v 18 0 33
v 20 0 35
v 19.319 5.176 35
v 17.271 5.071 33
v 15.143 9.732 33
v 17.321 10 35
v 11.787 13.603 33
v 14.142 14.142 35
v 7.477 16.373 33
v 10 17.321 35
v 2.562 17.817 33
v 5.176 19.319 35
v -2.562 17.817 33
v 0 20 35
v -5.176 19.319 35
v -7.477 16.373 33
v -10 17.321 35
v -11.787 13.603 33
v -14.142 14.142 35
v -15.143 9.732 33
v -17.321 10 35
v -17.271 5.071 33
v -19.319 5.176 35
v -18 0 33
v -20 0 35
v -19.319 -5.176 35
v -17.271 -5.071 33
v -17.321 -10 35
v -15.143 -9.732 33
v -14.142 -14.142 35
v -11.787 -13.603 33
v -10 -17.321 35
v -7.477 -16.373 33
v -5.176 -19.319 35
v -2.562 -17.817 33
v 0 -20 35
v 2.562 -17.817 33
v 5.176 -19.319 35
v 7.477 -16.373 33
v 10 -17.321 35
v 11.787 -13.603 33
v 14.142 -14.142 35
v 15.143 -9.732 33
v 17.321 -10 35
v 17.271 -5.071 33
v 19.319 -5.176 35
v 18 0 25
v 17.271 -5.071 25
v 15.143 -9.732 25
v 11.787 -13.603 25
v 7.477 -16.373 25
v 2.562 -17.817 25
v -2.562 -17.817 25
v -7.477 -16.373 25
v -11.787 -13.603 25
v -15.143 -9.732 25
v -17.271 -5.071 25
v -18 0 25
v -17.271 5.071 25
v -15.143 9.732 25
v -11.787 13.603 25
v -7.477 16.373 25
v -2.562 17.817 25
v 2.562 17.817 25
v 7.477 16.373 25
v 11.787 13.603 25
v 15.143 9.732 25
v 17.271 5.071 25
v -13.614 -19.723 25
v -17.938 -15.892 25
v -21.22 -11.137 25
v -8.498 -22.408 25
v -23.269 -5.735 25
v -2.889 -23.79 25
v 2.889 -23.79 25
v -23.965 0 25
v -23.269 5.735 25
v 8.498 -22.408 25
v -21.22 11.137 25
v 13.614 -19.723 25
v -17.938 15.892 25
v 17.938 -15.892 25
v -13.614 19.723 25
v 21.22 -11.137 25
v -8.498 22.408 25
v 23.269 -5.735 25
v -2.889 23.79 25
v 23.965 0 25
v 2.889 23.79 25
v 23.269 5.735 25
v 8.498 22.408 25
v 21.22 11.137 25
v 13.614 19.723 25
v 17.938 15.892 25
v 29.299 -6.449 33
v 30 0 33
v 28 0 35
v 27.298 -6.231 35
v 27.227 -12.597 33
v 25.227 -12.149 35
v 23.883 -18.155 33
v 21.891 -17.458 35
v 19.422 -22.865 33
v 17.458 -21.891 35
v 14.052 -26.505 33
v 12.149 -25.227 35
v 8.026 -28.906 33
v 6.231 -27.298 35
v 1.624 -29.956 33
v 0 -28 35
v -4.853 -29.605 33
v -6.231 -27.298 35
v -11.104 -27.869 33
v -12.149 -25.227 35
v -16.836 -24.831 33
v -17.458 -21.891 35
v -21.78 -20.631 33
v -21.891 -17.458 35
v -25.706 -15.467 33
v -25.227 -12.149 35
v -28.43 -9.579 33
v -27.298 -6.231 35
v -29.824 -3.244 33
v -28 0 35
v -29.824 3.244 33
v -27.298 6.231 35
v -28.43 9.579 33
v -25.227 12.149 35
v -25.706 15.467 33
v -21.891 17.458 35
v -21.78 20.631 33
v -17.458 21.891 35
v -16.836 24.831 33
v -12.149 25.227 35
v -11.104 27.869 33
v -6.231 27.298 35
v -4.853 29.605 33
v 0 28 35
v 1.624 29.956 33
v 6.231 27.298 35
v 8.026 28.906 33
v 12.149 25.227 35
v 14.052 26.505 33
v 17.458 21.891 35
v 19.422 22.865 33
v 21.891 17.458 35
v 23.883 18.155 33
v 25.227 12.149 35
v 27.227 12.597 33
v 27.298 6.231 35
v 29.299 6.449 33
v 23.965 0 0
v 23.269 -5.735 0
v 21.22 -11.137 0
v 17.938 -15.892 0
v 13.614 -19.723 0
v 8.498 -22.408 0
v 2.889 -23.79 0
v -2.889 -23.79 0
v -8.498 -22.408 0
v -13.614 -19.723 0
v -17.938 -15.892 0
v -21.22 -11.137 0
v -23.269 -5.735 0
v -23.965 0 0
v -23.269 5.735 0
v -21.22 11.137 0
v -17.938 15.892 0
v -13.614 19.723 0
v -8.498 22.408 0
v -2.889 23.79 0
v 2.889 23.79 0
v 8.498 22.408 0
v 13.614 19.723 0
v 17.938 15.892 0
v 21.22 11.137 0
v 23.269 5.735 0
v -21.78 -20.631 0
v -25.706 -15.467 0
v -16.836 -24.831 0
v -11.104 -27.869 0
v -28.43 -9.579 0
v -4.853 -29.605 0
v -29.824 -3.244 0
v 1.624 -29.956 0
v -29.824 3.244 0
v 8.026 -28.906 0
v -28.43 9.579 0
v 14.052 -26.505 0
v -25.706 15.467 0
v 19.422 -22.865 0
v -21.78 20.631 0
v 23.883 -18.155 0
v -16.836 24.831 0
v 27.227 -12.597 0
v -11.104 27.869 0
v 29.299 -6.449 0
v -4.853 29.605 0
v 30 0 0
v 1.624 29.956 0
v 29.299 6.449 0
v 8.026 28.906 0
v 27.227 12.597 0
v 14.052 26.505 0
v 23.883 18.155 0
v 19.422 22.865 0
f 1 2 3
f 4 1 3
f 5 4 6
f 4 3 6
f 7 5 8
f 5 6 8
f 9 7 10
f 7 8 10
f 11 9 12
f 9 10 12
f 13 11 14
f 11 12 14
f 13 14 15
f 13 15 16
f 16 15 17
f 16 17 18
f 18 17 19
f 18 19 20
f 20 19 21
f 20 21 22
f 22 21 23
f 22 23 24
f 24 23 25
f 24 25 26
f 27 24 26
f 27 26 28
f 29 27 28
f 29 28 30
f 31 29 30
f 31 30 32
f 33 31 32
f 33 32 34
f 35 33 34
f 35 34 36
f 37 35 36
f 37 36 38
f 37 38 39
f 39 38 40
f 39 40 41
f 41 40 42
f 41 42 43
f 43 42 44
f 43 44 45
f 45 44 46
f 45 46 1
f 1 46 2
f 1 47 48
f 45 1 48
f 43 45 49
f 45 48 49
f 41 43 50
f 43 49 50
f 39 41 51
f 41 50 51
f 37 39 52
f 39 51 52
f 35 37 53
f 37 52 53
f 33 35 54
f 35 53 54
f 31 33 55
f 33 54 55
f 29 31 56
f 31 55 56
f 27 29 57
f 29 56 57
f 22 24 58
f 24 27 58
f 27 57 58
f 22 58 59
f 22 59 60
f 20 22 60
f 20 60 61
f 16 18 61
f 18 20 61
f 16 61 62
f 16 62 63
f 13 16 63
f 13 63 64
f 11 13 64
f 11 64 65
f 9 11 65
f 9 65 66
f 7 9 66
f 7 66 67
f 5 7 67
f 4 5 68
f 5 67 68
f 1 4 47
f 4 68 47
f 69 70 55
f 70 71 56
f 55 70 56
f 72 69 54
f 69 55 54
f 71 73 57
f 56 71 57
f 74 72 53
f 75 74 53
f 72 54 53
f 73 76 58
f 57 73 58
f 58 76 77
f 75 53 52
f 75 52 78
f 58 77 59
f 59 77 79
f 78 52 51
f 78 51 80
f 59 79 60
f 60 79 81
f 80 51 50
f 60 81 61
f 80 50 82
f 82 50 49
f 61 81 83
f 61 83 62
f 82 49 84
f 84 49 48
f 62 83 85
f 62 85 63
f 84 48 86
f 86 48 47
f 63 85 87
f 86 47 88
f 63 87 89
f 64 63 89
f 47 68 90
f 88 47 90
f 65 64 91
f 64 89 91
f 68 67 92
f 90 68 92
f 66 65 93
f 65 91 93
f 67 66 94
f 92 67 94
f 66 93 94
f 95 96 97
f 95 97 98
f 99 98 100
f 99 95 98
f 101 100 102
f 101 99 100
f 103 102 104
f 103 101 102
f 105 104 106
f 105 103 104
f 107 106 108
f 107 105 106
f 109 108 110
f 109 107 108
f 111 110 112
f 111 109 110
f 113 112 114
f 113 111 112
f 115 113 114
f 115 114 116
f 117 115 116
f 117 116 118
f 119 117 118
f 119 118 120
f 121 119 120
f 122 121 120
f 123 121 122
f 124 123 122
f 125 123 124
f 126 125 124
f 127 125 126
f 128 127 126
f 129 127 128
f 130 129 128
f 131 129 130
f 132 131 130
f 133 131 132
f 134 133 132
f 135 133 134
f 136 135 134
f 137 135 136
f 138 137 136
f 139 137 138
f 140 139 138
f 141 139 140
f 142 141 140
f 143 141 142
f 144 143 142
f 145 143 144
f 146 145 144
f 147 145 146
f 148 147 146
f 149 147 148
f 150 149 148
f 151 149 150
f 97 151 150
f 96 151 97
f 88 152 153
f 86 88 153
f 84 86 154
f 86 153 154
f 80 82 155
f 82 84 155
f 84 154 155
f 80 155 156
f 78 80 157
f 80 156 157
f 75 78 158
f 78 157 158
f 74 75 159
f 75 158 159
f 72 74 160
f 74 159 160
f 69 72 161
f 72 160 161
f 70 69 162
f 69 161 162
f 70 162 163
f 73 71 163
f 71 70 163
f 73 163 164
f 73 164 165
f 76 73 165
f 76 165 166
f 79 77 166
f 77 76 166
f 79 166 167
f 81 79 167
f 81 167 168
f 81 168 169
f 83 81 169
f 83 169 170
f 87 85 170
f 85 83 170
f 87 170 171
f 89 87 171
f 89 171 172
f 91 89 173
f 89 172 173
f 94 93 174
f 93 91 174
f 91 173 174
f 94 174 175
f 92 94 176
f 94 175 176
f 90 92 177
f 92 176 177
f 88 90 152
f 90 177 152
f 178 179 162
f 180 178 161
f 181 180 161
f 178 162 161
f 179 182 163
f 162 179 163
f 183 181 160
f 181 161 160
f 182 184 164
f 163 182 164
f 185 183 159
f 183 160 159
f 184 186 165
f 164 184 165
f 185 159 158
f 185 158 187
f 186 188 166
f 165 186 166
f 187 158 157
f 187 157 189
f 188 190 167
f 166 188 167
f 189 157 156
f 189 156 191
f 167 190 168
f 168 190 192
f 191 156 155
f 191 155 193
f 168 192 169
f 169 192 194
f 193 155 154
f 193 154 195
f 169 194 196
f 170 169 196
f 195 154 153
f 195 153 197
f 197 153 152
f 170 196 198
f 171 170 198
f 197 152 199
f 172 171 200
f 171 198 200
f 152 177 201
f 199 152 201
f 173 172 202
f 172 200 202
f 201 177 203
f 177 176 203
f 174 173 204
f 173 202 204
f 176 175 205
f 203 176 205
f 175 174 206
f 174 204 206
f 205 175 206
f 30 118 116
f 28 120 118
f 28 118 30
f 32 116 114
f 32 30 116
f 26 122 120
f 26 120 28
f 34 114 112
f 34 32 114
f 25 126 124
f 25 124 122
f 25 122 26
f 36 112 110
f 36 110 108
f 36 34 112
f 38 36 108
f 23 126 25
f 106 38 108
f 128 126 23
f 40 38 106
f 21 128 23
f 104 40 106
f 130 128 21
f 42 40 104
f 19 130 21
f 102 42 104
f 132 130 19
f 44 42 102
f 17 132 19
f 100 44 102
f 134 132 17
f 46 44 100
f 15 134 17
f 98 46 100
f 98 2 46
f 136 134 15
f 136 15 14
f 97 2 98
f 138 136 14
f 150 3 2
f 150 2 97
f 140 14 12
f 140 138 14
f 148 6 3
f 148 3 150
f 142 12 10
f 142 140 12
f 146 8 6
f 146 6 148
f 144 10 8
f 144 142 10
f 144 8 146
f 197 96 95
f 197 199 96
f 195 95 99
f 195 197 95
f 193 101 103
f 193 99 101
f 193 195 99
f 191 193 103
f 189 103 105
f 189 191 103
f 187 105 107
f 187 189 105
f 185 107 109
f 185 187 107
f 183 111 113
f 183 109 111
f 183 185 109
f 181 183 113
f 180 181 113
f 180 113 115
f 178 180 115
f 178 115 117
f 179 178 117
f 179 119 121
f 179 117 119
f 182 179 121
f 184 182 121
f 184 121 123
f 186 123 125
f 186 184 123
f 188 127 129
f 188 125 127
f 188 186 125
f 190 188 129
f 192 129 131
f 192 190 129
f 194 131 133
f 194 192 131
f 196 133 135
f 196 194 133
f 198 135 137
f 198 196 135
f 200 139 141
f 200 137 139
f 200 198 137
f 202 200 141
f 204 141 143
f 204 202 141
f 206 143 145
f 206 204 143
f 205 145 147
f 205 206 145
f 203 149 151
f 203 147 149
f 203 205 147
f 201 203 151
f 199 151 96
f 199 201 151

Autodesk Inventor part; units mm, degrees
ref_plane "YZ Plane" through (0, 0, 0) normal (1, 0, 0) x (0, 1, 0)
ref_plane "XZ Plane" through (0, 0, 0) normal (0, 1, 0) x (-1, 0, 0)
ref_plane "XY Plane" through (0, 0, 0) normal (0, 0, 1) x (1, 0, 0)
sketch "Sketch1" plane through (0, 0, 0) normal (0, 0, 1) x (1, 0, 0)
  circle A0 centre (0, 0) radius 23.965
  circle A1 centre (0, 0) radius 30
  spline S0 degree 3 poles (-14.0044, 16.3473) (-10.6248, 19.2425) (-6.3279, 21.0504) (-1.895, 21.4422) (2.5312, 21.8334) (7.0716, 20.8109) (10.9029, 18.5603) (14.7508, 16.3) (17.8645, 12.8114) (19.6749, 8.7325) (21.4787, 4.6683) (21.9802, 0.0378) (21.0881, -4.3184) (20.1947, -8.6815) (17.9074, -12.7482) (14.643, -15.7779) (13.057, -17.2497) (11.2477, -18.4805) (9.2962, -19.4149) knots 101.316363 101.316363 101.316363 101.316363 101.936571 101.936571 101.936571 102.555845 102.555845 102.555845 103.177798 103.177798 103.177798 103.797501 103.797501 103.797501 104.418203 104.418203 104.418203 104.719755 104.719755 104.719755 104.719755 construction
  circle A2 centre (0, 0) radius 20.7257 construction
  line L0 (9.2962, -19.4149) -> (0, 0) construction
  dimension "d0" = 47.93
  dimension "d2" = 60
  dimension "d26" = 6.035
  dimension "d27" = 21.5257
extrude "Extrusion1" add sketch "Sketch1" along normal blind 25
sketch "Sketch3" plane through (0, 0, 25) normal (0, 0, 1) x (1, 0, 0)
  circle A0 centre (0, 0) radius 23.965 construction
  circle A1 centre (0, 0) radius 30 projected
  circle A2 centre (0, 0) radius 18
  dimension "d25" = 36
extrude "Extrusion2" add sketch "Sketch3" along normal blind 10
chamfer "Chamfer2" distance 2 angle 45 2 edges at (-30, 0, 35) (-18, 0, 35)
thread "Thread2" size "M48x1.5" class "6H" standard "ISO Metric profile" full length
equation "\"d0\" = Tread_OD"
equation "\"d2\" = NutCap_OD"
equation "\"d3\" = NutCapTread_L"
equation "\"d25\" = Screw_DIA"
equation "\"TD\" = 0.3"
equation "\"Ball_DIA\" = 6"
equation "\"Screw_L\" = 292"
equation "\"Screw_DIA\" = 36"
equation "\"Nut_OD\" = 66"
equation "\"BPath_REVQ\" = 5.75"
equation "\"Tread_OFFSET\" = 8.075"
equation "\"SteeringColumn_DIA\" = 26"
equation "\"SteeringColumnChamfer_DEG\" = 20deg"
equation "\"Rack_L\" = 307.252"
equation "\"NutCapTread_L\" = 25"
equation "\"NutCapTread_THICKNESS\" = 5.365"
equation "\"NutCap_OD\" = 60"
equation "\"SupportFlange_THICKNESS\" = 5"
equation "\"GearKey_L\" = 32"
equation "\"Tread_OD\" = 47.93"
properties part number "MCEN4000:B4" material "STAINLESS STEEL, AISI 302"
